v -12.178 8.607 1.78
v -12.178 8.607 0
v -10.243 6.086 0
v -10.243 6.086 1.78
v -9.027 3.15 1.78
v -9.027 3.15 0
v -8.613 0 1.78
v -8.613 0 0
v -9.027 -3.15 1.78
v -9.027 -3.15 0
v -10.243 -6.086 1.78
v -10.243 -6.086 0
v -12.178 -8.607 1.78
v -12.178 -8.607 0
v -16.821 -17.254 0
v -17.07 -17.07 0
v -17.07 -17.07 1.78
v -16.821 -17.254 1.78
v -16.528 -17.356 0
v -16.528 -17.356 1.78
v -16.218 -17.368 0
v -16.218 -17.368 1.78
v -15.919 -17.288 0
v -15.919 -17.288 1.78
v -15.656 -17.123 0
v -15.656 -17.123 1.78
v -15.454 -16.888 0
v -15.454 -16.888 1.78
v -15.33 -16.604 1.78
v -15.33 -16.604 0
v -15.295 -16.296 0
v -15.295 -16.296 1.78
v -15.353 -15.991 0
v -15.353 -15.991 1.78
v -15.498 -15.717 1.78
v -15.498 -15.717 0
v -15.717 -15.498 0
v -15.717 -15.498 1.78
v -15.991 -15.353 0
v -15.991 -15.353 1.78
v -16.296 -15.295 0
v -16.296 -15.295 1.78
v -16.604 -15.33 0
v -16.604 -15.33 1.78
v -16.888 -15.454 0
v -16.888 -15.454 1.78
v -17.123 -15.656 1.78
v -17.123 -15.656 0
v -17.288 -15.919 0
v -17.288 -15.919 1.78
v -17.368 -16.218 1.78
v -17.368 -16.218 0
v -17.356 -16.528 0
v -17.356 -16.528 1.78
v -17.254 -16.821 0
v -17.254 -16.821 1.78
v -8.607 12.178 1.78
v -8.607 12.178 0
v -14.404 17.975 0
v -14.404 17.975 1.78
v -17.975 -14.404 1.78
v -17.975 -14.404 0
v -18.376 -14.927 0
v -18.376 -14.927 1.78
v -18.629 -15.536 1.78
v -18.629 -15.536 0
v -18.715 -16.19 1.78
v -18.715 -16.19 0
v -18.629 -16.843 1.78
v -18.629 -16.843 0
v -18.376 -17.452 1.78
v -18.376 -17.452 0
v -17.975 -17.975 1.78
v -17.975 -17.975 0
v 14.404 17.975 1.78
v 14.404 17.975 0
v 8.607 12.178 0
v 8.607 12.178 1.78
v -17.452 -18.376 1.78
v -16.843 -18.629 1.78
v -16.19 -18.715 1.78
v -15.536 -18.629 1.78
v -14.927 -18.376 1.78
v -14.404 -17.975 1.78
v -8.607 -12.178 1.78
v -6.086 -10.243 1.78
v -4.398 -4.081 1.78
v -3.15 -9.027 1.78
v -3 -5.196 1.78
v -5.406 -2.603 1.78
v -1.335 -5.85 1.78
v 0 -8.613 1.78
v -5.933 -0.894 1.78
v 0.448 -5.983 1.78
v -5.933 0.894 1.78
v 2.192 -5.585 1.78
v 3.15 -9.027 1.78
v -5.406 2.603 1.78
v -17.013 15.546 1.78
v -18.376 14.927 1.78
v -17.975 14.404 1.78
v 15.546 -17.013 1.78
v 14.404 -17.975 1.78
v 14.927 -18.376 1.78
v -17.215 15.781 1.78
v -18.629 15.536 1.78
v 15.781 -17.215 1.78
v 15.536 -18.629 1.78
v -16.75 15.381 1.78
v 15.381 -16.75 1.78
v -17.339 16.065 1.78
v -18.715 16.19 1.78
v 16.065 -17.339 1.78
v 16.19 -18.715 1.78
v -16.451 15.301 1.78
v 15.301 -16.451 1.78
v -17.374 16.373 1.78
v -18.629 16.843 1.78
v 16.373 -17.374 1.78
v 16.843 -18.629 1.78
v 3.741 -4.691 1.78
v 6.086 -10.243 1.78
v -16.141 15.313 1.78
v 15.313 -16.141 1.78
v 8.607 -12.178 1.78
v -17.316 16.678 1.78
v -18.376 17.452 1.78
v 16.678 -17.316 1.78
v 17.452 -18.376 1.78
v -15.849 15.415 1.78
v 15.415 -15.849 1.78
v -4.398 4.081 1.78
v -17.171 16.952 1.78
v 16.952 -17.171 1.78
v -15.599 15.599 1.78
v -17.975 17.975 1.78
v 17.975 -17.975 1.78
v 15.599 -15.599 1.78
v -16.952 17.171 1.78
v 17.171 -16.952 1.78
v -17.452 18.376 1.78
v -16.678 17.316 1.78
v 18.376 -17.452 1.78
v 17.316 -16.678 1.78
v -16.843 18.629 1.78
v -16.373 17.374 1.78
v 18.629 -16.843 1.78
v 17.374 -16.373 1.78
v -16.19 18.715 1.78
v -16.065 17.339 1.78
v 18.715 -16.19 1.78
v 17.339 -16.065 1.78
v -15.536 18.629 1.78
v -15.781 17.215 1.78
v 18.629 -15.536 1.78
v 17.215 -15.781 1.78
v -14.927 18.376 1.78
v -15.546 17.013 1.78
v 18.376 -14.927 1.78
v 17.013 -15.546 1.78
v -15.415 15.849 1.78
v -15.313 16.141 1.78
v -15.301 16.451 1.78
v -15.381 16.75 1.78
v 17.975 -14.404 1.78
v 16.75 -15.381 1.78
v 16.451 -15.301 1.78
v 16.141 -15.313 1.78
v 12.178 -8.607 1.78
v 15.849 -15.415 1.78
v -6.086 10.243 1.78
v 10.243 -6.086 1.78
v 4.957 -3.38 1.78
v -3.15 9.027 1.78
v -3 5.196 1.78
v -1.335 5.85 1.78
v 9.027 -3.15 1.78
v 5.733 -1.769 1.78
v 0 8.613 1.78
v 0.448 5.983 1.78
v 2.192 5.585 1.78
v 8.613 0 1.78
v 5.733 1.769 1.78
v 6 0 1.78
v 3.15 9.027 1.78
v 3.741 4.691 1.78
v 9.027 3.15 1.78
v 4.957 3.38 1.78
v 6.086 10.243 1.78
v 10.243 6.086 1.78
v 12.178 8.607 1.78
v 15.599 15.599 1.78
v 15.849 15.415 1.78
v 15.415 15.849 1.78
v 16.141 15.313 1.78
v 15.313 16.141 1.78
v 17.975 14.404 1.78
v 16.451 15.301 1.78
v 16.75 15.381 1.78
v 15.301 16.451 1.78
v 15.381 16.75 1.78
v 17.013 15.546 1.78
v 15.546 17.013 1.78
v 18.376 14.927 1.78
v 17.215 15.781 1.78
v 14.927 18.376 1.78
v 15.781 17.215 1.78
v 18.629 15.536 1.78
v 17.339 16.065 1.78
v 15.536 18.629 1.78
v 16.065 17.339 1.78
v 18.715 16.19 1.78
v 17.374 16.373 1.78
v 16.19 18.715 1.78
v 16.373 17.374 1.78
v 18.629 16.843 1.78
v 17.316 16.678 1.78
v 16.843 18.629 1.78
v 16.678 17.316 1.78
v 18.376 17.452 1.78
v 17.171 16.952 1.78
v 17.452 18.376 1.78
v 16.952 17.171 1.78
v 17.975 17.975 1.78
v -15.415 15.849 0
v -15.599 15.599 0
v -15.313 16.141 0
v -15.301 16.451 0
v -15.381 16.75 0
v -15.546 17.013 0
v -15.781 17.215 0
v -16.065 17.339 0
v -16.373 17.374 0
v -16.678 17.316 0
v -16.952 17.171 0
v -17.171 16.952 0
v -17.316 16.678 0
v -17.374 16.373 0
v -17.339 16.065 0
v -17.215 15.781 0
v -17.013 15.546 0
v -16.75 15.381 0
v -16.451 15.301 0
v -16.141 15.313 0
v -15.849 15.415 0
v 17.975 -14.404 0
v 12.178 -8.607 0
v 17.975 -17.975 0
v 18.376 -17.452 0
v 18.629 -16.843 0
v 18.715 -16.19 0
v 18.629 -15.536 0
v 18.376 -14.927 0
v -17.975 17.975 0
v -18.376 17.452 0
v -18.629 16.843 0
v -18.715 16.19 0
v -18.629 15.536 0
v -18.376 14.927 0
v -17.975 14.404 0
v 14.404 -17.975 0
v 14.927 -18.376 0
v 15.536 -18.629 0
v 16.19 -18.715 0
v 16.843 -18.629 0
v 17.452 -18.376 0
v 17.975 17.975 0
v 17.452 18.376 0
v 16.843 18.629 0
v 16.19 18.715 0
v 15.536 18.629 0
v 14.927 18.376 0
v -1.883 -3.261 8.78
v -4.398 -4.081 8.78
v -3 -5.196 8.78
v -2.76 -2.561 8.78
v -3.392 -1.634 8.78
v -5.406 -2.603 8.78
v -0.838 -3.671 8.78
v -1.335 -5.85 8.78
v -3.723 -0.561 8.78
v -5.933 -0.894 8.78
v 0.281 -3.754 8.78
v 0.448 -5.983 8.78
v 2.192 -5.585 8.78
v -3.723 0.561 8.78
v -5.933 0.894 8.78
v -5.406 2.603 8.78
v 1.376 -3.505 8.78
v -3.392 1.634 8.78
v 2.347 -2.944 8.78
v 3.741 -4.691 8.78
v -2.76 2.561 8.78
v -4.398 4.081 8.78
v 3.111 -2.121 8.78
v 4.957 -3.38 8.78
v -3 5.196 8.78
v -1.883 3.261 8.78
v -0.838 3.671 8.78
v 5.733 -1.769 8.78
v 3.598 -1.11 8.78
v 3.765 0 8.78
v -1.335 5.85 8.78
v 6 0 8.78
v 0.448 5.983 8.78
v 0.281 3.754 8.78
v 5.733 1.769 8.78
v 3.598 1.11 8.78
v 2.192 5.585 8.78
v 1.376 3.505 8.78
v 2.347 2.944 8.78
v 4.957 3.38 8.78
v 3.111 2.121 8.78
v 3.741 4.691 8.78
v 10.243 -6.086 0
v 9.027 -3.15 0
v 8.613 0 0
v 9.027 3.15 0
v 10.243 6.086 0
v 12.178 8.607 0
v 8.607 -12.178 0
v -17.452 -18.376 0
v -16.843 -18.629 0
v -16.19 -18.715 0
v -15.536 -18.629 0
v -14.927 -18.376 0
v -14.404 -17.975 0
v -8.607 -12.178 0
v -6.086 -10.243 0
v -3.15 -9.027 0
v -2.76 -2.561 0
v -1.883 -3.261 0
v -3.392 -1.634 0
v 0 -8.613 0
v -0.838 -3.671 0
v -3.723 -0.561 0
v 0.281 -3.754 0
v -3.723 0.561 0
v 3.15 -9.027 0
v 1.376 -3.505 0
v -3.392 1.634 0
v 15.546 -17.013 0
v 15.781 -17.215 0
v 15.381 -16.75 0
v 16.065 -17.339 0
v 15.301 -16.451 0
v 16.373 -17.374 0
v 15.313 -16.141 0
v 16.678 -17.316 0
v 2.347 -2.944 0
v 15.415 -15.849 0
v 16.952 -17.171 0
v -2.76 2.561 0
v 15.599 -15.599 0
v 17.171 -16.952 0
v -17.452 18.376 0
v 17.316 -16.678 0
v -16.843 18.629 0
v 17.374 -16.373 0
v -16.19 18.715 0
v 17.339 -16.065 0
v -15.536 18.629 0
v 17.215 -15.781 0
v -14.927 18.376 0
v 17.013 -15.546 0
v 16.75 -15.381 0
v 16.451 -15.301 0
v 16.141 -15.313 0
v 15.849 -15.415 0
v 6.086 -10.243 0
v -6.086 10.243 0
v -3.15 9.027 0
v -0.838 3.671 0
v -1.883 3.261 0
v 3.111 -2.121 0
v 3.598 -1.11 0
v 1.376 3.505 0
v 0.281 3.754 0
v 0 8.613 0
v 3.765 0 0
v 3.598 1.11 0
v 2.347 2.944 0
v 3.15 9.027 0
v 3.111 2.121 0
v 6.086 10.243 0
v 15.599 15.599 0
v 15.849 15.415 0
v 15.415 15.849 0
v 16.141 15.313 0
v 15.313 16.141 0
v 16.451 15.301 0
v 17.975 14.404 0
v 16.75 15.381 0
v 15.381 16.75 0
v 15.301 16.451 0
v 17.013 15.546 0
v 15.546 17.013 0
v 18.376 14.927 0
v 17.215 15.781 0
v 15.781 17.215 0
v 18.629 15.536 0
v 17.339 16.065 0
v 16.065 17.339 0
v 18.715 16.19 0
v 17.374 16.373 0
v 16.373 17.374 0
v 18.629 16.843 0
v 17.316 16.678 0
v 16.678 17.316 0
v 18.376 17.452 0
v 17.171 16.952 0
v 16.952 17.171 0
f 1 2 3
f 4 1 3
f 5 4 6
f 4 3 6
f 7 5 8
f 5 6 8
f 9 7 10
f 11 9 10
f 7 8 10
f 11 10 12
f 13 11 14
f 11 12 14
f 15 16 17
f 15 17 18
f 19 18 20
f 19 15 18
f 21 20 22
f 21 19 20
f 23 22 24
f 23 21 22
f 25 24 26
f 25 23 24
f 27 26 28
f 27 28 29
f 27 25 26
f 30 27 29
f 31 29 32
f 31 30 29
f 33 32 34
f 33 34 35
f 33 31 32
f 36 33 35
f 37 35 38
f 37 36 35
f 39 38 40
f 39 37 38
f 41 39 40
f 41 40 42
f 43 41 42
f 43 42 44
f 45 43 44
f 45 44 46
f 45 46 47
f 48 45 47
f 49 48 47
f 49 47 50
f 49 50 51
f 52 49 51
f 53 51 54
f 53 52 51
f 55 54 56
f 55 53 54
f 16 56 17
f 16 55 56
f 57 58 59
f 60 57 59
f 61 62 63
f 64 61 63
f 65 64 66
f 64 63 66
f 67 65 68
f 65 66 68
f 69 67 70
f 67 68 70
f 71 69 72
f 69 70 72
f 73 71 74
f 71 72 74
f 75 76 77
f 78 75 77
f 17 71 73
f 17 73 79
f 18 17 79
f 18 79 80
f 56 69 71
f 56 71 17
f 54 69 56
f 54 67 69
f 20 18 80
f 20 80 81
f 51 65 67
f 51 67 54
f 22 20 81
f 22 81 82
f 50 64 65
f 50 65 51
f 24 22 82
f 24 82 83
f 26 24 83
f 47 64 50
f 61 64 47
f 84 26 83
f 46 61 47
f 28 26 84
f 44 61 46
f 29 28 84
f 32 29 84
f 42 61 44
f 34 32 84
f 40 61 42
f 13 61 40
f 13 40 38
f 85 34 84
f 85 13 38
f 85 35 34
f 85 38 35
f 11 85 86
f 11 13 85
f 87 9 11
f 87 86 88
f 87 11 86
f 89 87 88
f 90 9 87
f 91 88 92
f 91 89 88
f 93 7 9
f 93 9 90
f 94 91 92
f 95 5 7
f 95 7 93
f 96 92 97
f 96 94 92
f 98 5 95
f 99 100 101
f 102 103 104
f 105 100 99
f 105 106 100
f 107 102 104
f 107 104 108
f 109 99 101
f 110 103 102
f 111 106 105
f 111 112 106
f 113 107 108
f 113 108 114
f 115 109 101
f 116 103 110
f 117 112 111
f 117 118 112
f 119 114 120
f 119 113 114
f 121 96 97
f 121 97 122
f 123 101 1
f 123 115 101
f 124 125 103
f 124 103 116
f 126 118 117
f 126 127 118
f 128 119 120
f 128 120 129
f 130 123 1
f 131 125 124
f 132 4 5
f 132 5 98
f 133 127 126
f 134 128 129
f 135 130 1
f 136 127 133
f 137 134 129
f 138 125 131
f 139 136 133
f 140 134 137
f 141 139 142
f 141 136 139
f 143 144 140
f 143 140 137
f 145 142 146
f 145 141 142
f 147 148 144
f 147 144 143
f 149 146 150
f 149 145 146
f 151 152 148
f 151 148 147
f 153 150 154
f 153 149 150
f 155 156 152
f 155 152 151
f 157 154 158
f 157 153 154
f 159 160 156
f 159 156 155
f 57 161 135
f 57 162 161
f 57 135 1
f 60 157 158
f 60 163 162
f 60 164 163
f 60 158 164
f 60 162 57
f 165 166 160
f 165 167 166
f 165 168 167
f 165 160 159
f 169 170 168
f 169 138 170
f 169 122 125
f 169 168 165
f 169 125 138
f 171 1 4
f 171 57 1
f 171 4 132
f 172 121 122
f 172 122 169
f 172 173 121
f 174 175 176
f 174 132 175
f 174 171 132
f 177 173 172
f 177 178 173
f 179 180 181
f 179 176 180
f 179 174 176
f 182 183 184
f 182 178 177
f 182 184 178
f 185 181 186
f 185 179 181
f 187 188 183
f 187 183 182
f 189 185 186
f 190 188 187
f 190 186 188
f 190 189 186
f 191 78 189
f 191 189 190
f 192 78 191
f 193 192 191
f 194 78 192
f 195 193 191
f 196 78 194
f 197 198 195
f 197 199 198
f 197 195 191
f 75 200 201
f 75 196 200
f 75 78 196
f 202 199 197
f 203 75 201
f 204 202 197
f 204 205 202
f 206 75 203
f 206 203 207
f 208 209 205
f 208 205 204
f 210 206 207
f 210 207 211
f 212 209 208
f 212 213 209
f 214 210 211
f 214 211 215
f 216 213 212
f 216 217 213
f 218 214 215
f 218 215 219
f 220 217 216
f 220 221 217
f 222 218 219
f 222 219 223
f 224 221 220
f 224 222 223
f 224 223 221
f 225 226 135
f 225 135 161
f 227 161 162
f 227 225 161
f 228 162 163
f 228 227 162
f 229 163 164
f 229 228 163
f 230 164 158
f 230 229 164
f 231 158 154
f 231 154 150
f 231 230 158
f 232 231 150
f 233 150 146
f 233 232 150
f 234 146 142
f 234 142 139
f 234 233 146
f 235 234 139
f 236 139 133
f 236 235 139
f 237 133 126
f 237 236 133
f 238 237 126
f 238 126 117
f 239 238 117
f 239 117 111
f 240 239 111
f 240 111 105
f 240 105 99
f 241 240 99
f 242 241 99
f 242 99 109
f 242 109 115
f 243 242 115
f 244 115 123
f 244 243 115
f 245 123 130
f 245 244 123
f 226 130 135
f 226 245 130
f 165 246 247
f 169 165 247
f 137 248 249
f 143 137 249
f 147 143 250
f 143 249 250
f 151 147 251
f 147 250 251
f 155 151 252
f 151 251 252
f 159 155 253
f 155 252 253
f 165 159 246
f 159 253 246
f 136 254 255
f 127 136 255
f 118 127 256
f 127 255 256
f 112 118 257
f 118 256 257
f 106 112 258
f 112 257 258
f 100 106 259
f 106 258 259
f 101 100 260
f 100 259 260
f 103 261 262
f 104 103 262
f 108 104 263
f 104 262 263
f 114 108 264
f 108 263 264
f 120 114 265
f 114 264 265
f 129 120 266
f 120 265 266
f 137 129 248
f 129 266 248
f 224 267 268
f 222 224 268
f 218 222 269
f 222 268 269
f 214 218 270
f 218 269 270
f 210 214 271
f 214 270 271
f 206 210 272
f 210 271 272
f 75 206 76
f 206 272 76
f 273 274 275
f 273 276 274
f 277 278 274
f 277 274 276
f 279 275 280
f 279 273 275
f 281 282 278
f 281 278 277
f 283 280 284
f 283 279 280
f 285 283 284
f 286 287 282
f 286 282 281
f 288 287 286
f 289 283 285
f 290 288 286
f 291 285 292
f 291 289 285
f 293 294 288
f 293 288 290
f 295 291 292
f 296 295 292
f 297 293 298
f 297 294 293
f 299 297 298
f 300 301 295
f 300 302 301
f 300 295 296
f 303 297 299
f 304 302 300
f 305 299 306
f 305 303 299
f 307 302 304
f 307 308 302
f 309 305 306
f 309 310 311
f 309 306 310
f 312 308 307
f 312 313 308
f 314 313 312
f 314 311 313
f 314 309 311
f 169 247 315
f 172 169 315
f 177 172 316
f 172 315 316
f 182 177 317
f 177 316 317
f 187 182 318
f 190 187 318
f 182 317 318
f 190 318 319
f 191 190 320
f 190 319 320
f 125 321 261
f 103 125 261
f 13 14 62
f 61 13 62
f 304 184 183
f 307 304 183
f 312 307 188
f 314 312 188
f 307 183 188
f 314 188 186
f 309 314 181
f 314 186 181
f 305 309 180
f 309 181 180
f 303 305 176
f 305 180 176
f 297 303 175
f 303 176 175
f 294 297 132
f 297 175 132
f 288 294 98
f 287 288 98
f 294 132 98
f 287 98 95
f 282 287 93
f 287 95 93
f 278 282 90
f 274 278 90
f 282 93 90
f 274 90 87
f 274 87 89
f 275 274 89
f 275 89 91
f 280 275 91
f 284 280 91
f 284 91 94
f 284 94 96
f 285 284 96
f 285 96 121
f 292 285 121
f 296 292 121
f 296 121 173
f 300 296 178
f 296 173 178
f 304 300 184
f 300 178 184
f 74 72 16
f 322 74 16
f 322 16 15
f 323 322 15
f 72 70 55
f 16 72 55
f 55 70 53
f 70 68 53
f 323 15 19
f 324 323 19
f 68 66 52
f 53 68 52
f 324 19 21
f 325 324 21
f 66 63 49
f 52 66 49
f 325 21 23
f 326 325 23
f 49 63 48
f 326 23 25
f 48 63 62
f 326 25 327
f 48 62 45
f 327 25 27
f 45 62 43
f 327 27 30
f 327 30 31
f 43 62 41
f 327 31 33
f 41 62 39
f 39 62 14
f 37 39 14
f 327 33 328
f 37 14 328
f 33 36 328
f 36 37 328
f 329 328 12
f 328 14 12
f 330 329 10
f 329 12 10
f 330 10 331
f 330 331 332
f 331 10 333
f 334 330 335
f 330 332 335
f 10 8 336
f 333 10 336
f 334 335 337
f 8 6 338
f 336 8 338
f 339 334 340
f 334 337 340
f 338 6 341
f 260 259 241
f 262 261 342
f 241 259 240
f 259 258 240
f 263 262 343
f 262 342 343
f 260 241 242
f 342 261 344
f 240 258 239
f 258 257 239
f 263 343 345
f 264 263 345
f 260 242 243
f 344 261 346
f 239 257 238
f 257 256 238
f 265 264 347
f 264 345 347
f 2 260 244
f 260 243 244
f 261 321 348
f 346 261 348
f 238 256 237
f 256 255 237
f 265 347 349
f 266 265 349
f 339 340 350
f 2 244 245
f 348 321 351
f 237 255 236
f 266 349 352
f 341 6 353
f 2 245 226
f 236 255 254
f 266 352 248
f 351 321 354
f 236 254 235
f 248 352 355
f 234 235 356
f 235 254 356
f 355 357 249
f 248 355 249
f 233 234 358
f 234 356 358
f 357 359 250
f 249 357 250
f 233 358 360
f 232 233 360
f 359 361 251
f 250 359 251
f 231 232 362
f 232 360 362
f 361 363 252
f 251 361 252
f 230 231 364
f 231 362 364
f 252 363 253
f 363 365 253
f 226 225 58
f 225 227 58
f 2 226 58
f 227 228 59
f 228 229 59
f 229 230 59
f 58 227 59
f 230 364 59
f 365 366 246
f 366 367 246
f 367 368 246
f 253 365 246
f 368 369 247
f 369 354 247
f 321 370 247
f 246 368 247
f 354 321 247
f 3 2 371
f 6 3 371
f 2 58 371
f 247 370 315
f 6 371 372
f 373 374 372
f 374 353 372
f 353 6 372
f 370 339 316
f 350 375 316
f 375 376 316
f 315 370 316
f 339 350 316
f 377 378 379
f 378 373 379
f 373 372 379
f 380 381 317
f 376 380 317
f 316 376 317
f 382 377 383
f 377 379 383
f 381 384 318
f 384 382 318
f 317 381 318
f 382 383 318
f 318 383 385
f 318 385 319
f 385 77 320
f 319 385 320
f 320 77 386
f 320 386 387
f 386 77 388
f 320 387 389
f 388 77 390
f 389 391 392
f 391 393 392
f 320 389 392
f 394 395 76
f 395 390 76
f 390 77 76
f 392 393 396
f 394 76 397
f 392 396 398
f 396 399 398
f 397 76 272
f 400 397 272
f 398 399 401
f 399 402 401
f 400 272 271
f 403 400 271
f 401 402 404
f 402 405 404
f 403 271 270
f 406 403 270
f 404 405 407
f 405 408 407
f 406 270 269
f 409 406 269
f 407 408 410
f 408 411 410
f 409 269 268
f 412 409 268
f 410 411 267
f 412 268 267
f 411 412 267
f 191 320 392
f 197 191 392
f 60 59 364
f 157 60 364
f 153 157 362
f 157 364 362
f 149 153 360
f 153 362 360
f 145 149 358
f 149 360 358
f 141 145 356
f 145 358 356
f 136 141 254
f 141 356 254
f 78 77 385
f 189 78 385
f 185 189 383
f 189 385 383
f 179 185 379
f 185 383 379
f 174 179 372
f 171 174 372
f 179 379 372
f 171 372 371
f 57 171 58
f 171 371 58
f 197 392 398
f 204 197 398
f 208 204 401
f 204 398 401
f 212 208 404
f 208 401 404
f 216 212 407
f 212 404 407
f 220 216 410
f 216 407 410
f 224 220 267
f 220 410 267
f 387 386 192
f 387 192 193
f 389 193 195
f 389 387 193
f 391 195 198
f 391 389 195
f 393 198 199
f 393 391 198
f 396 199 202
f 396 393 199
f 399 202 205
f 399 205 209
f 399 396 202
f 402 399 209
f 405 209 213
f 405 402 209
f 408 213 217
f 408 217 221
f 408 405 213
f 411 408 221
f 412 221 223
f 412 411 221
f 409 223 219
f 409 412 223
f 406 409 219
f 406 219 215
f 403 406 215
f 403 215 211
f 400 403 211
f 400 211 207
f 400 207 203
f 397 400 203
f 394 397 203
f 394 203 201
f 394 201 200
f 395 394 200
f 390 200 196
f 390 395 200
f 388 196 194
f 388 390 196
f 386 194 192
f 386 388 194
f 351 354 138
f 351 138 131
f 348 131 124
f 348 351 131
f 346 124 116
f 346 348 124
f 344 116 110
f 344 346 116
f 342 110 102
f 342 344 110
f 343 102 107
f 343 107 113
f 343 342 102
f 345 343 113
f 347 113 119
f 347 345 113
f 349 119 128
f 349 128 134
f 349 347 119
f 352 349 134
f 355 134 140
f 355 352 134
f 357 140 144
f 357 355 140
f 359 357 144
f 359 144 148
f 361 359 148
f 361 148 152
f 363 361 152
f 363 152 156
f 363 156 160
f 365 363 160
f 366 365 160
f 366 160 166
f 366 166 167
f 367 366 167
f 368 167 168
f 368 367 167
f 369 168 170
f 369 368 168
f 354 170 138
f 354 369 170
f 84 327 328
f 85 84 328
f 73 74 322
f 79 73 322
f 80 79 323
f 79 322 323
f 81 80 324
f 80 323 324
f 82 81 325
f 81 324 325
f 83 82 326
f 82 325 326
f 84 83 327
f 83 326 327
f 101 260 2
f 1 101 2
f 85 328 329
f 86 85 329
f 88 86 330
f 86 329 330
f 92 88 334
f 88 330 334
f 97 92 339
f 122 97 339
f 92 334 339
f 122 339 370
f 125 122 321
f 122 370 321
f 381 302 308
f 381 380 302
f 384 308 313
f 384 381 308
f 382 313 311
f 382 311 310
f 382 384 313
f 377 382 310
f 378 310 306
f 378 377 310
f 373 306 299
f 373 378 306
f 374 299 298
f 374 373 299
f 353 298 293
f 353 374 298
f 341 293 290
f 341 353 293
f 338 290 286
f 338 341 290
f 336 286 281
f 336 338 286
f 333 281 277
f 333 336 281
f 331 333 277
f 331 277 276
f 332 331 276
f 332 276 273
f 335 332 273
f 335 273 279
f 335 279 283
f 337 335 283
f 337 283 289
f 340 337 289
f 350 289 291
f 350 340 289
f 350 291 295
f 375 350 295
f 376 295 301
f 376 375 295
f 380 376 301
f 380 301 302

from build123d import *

# Parameters (mm, degrees)
SKETCH1_R           = 3.765
BOSS_EXTRUDE1_DEPTH = 1.78
SKETCH2_R           = 6
SKETCH2_R_2         = 3.765
BOSS_EXTRUDE2_DEPTH = 7


with BuildPart() as part:
    # Sketch1 → Boss-Extrude1 (new body)
    with BuildSketch(Plane.XY):
        with BuildLine():
            Line((-17.975, 14.404110755), (-12.177560595, 8.60667135))
            ThreePointArc((-12.177560595, 8.60667135), (-8.612560595, 0), (-12.177560595, -8.60667135))
            Line((-12.177560595, -8.60667135), (-17.975, -14.404110755))
            ThreePointArc((-17.975, -14.404110755), (-18.714555378, -16.189555378), (-17.975, -17.975))
            ThreePointArc((-17.975, -17.975), (-16.189555378, -18.714555378), (-14.404110755, -17.975))
            Line((-14.404110755, -17.975), (-8.60667135, -12.177560595))
            ThreePointArc((-8.60667135, -12.177560595), (0, -8.612560595), (8.60667135, -12.177560595))
            Line((8.60667135, -12.177560595), (14.404110755, -17.975))
            ThreePointArc((14.404110755, -17.975), (16.189555378, -18.714555378), (17.975, -17.975))
            ThreePointArc((17.975, -17.975), (18.714555378, -16.189555378), (17.975, -14.404110755))
            Line((17.975, -14.404110755), (12.177560595, -8.60667135))
            ThreePointArc((12.177560595, -8.60667135), (8.612560595, 0), (12.177560595, 8.60667135))
            Line((12.177560595, 8.60667135), (17.975, 14.404110755))
            ThreePointArc((17.975, 14.404110755), (18.714555378, 16.189555378), (17.975, 17.975))
            ThreePointArc((17.975, 17.975), (16.189555378, 18.714555378), (14.404110755, 17.975))
            Line((14.404110755, 17.975), (8.60667135, 12.177560595))
            ThreePointArc((8.60667135, 12.177560595), (0, 8.612560595), (-8.60667135, 12.177560595))
            Line((-8.60667135, 12.177560595), (-14.404110755, 17.975))
            ThreePointArc((-14.404110755, 17.975), (-16.189555378, 18.714555378), (-17.975, 17.975))
            ThreePointArc((-17.975, 17.975), (-18.714555378, 16.189555378), (-17.975, 14.404110755))
        make_face()
        Circle(SKETCH1_R, mode=Mode.SUBTRACT)
        with BuildLine():
            ThreePointArc((-17.07, 17.07), (-17.07, 15.599217895), (-15.599217895, 15.599217895))
            ThreePointArc((-15.599217895, 15.599217895), (-15.599217895, 17.07), (-17.07, 17.07))
        make_face(mode=Mode.SUBTRACT)
        with BuildLine():
            ThreePointArc((-15.599217895, -15.599217895), (-17.07, -15.599217895), (-17.07, -17.07))
            ThreePointArc((-17.07, -17.07), (-15.599217895, -17.07), (-15.599217895, -15.599217895))
        make_face(mode=Mode.SUBTRACT)
        with BuildLine():
            ThreePointArc((17.07, 17.07), (15.599217895, 17.07), (15.599217895, 15.599217895))
            ThreePointArc((15.599217895, 15.599217895), (17.07, 15.599217895), (17.07, 17.07))
        make_face(mode=Mode.SUBTRACT)
        with BuildLine():
            ThreePointArc((17.07, -17.07), (17.07, -15.599217895), (15.599217895, -15.599217895))
            ThreePointArc((15.599217895, -15.599217895), (15.599217895, -17.07), (17.07, -17.07))
        make_face(mode=Mode.SUBTRACT)
    extrude(amount=BOSS_EXTRUDE1_DEPTH)

    # Sketch2 → Boss-Extrude2 (add)
    with BuildSketch(Plane.XY.offset(1.78)):
        Circle(SKETCH2_R)
        Circle(SKETCH2_R_2, mode=Mode.SUBTRACT)
    extrude(amount=BOSS_EXTRUDE2_DEPTH)


solid = part.part
